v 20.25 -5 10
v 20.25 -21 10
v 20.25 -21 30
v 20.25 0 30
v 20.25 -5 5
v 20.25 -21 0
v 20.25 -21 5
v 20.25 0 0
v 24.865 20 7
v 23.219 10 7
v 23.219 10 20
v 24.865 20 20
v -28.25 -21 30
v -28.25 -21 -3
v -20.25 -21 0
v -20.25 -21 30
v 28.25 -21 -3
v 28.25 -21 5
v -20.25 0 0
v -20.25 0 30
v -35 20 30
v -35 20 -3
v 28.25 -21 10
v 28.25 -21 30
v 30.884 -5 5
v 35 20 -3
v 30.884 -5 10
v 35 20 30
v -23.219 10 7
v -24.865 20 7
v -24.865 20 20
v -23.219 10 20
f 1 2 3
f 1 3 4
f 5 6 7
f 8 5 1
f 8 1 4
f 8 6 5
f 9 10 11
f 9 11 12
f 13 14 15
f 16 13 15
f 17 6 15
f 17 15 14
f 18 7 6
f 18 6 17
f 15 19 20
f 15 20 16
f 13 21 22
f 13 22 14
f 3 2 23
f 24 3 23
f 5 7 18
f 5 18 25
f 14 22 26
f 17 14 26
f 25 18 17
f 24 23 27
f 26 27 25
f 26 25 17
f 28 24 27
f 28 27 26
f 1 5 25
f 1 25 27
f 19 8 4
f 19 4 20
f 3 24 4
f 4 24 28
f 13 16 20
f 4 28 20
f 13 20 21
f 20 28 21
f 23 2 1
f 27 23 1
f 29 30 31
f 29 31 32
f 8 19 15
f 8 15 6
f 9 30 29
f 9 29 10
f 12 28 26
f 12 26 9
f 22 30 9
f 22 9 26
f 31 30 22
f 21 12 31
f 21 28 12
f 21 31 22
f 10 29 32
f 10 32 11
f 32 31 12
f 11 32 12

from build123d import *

# Parameters (mm, degrees)
RESSALTO_EXTRUS_O1_DEPTH = 30
RESSALTO_EXTRUS_O2_DEPTH = 3
CASCA1_START             = 7
CASCA1_DEPTH             = 13
ESBO_O3_W                = 5
ESBO_O3_H                = 20
CORTE_EXTRUS_O1_DEPTH    = 67.283953563


# Read off the part's stored shape, not the designer's step: Casca1
with BuildPart() as part:
    # Esboço1 → Ressalto-extrusão1 (new body)
    with BuildSketch(Plane.XY):
        Polygon((-35, 20), (35, 20), (28.25, -21), (20.25, -21), (20.25, 0), (-20.25, 0), (-20.25, -21), (-28.25, -21), align=None)
    extrude(amount=RESSALTO_EXTRUS_O1_DEPTH)

    # Esboço2 → Ressalto-extrusão2 (add)
    with BuildSketch(Plane(origin=(0, 0, 0), x_dir=(-1, 0, 0), z_dir=(0, 0, -1))):
        Polygon((-35, 20), (35, 20), (28.25, -21), (-28.25, -21), align=None)
    extrude(amount=RESSALTO_EXTRUS_O2_DEPTH)

    # Casca1 outline → Casca1 (cut)
    with BuildSketch(Plane.XY.offset(CASCA1_START)):
        Polygon((-24.865384062, 20), (-23.219042598, 10), (23.219042598, 10), (24.865384062, 20), align=None)
    extrude(amount=CASCA1_DEPTH, mode=Mode.SUBTRACT)

    # Esboço3 → Corte-extrusão1 (cut, through all)
    with BuildSketch(Plane.ZY.offset(-20.25)):
        with Locations((7.5, -15)):
            Rectangle(ESBO_O3_W, ESBO_O3_H)
    extrude(amount=-CORTE_EXTRUS_O1_DEPTH, mode=Mode.SUBTRACT)


solid = part.part
